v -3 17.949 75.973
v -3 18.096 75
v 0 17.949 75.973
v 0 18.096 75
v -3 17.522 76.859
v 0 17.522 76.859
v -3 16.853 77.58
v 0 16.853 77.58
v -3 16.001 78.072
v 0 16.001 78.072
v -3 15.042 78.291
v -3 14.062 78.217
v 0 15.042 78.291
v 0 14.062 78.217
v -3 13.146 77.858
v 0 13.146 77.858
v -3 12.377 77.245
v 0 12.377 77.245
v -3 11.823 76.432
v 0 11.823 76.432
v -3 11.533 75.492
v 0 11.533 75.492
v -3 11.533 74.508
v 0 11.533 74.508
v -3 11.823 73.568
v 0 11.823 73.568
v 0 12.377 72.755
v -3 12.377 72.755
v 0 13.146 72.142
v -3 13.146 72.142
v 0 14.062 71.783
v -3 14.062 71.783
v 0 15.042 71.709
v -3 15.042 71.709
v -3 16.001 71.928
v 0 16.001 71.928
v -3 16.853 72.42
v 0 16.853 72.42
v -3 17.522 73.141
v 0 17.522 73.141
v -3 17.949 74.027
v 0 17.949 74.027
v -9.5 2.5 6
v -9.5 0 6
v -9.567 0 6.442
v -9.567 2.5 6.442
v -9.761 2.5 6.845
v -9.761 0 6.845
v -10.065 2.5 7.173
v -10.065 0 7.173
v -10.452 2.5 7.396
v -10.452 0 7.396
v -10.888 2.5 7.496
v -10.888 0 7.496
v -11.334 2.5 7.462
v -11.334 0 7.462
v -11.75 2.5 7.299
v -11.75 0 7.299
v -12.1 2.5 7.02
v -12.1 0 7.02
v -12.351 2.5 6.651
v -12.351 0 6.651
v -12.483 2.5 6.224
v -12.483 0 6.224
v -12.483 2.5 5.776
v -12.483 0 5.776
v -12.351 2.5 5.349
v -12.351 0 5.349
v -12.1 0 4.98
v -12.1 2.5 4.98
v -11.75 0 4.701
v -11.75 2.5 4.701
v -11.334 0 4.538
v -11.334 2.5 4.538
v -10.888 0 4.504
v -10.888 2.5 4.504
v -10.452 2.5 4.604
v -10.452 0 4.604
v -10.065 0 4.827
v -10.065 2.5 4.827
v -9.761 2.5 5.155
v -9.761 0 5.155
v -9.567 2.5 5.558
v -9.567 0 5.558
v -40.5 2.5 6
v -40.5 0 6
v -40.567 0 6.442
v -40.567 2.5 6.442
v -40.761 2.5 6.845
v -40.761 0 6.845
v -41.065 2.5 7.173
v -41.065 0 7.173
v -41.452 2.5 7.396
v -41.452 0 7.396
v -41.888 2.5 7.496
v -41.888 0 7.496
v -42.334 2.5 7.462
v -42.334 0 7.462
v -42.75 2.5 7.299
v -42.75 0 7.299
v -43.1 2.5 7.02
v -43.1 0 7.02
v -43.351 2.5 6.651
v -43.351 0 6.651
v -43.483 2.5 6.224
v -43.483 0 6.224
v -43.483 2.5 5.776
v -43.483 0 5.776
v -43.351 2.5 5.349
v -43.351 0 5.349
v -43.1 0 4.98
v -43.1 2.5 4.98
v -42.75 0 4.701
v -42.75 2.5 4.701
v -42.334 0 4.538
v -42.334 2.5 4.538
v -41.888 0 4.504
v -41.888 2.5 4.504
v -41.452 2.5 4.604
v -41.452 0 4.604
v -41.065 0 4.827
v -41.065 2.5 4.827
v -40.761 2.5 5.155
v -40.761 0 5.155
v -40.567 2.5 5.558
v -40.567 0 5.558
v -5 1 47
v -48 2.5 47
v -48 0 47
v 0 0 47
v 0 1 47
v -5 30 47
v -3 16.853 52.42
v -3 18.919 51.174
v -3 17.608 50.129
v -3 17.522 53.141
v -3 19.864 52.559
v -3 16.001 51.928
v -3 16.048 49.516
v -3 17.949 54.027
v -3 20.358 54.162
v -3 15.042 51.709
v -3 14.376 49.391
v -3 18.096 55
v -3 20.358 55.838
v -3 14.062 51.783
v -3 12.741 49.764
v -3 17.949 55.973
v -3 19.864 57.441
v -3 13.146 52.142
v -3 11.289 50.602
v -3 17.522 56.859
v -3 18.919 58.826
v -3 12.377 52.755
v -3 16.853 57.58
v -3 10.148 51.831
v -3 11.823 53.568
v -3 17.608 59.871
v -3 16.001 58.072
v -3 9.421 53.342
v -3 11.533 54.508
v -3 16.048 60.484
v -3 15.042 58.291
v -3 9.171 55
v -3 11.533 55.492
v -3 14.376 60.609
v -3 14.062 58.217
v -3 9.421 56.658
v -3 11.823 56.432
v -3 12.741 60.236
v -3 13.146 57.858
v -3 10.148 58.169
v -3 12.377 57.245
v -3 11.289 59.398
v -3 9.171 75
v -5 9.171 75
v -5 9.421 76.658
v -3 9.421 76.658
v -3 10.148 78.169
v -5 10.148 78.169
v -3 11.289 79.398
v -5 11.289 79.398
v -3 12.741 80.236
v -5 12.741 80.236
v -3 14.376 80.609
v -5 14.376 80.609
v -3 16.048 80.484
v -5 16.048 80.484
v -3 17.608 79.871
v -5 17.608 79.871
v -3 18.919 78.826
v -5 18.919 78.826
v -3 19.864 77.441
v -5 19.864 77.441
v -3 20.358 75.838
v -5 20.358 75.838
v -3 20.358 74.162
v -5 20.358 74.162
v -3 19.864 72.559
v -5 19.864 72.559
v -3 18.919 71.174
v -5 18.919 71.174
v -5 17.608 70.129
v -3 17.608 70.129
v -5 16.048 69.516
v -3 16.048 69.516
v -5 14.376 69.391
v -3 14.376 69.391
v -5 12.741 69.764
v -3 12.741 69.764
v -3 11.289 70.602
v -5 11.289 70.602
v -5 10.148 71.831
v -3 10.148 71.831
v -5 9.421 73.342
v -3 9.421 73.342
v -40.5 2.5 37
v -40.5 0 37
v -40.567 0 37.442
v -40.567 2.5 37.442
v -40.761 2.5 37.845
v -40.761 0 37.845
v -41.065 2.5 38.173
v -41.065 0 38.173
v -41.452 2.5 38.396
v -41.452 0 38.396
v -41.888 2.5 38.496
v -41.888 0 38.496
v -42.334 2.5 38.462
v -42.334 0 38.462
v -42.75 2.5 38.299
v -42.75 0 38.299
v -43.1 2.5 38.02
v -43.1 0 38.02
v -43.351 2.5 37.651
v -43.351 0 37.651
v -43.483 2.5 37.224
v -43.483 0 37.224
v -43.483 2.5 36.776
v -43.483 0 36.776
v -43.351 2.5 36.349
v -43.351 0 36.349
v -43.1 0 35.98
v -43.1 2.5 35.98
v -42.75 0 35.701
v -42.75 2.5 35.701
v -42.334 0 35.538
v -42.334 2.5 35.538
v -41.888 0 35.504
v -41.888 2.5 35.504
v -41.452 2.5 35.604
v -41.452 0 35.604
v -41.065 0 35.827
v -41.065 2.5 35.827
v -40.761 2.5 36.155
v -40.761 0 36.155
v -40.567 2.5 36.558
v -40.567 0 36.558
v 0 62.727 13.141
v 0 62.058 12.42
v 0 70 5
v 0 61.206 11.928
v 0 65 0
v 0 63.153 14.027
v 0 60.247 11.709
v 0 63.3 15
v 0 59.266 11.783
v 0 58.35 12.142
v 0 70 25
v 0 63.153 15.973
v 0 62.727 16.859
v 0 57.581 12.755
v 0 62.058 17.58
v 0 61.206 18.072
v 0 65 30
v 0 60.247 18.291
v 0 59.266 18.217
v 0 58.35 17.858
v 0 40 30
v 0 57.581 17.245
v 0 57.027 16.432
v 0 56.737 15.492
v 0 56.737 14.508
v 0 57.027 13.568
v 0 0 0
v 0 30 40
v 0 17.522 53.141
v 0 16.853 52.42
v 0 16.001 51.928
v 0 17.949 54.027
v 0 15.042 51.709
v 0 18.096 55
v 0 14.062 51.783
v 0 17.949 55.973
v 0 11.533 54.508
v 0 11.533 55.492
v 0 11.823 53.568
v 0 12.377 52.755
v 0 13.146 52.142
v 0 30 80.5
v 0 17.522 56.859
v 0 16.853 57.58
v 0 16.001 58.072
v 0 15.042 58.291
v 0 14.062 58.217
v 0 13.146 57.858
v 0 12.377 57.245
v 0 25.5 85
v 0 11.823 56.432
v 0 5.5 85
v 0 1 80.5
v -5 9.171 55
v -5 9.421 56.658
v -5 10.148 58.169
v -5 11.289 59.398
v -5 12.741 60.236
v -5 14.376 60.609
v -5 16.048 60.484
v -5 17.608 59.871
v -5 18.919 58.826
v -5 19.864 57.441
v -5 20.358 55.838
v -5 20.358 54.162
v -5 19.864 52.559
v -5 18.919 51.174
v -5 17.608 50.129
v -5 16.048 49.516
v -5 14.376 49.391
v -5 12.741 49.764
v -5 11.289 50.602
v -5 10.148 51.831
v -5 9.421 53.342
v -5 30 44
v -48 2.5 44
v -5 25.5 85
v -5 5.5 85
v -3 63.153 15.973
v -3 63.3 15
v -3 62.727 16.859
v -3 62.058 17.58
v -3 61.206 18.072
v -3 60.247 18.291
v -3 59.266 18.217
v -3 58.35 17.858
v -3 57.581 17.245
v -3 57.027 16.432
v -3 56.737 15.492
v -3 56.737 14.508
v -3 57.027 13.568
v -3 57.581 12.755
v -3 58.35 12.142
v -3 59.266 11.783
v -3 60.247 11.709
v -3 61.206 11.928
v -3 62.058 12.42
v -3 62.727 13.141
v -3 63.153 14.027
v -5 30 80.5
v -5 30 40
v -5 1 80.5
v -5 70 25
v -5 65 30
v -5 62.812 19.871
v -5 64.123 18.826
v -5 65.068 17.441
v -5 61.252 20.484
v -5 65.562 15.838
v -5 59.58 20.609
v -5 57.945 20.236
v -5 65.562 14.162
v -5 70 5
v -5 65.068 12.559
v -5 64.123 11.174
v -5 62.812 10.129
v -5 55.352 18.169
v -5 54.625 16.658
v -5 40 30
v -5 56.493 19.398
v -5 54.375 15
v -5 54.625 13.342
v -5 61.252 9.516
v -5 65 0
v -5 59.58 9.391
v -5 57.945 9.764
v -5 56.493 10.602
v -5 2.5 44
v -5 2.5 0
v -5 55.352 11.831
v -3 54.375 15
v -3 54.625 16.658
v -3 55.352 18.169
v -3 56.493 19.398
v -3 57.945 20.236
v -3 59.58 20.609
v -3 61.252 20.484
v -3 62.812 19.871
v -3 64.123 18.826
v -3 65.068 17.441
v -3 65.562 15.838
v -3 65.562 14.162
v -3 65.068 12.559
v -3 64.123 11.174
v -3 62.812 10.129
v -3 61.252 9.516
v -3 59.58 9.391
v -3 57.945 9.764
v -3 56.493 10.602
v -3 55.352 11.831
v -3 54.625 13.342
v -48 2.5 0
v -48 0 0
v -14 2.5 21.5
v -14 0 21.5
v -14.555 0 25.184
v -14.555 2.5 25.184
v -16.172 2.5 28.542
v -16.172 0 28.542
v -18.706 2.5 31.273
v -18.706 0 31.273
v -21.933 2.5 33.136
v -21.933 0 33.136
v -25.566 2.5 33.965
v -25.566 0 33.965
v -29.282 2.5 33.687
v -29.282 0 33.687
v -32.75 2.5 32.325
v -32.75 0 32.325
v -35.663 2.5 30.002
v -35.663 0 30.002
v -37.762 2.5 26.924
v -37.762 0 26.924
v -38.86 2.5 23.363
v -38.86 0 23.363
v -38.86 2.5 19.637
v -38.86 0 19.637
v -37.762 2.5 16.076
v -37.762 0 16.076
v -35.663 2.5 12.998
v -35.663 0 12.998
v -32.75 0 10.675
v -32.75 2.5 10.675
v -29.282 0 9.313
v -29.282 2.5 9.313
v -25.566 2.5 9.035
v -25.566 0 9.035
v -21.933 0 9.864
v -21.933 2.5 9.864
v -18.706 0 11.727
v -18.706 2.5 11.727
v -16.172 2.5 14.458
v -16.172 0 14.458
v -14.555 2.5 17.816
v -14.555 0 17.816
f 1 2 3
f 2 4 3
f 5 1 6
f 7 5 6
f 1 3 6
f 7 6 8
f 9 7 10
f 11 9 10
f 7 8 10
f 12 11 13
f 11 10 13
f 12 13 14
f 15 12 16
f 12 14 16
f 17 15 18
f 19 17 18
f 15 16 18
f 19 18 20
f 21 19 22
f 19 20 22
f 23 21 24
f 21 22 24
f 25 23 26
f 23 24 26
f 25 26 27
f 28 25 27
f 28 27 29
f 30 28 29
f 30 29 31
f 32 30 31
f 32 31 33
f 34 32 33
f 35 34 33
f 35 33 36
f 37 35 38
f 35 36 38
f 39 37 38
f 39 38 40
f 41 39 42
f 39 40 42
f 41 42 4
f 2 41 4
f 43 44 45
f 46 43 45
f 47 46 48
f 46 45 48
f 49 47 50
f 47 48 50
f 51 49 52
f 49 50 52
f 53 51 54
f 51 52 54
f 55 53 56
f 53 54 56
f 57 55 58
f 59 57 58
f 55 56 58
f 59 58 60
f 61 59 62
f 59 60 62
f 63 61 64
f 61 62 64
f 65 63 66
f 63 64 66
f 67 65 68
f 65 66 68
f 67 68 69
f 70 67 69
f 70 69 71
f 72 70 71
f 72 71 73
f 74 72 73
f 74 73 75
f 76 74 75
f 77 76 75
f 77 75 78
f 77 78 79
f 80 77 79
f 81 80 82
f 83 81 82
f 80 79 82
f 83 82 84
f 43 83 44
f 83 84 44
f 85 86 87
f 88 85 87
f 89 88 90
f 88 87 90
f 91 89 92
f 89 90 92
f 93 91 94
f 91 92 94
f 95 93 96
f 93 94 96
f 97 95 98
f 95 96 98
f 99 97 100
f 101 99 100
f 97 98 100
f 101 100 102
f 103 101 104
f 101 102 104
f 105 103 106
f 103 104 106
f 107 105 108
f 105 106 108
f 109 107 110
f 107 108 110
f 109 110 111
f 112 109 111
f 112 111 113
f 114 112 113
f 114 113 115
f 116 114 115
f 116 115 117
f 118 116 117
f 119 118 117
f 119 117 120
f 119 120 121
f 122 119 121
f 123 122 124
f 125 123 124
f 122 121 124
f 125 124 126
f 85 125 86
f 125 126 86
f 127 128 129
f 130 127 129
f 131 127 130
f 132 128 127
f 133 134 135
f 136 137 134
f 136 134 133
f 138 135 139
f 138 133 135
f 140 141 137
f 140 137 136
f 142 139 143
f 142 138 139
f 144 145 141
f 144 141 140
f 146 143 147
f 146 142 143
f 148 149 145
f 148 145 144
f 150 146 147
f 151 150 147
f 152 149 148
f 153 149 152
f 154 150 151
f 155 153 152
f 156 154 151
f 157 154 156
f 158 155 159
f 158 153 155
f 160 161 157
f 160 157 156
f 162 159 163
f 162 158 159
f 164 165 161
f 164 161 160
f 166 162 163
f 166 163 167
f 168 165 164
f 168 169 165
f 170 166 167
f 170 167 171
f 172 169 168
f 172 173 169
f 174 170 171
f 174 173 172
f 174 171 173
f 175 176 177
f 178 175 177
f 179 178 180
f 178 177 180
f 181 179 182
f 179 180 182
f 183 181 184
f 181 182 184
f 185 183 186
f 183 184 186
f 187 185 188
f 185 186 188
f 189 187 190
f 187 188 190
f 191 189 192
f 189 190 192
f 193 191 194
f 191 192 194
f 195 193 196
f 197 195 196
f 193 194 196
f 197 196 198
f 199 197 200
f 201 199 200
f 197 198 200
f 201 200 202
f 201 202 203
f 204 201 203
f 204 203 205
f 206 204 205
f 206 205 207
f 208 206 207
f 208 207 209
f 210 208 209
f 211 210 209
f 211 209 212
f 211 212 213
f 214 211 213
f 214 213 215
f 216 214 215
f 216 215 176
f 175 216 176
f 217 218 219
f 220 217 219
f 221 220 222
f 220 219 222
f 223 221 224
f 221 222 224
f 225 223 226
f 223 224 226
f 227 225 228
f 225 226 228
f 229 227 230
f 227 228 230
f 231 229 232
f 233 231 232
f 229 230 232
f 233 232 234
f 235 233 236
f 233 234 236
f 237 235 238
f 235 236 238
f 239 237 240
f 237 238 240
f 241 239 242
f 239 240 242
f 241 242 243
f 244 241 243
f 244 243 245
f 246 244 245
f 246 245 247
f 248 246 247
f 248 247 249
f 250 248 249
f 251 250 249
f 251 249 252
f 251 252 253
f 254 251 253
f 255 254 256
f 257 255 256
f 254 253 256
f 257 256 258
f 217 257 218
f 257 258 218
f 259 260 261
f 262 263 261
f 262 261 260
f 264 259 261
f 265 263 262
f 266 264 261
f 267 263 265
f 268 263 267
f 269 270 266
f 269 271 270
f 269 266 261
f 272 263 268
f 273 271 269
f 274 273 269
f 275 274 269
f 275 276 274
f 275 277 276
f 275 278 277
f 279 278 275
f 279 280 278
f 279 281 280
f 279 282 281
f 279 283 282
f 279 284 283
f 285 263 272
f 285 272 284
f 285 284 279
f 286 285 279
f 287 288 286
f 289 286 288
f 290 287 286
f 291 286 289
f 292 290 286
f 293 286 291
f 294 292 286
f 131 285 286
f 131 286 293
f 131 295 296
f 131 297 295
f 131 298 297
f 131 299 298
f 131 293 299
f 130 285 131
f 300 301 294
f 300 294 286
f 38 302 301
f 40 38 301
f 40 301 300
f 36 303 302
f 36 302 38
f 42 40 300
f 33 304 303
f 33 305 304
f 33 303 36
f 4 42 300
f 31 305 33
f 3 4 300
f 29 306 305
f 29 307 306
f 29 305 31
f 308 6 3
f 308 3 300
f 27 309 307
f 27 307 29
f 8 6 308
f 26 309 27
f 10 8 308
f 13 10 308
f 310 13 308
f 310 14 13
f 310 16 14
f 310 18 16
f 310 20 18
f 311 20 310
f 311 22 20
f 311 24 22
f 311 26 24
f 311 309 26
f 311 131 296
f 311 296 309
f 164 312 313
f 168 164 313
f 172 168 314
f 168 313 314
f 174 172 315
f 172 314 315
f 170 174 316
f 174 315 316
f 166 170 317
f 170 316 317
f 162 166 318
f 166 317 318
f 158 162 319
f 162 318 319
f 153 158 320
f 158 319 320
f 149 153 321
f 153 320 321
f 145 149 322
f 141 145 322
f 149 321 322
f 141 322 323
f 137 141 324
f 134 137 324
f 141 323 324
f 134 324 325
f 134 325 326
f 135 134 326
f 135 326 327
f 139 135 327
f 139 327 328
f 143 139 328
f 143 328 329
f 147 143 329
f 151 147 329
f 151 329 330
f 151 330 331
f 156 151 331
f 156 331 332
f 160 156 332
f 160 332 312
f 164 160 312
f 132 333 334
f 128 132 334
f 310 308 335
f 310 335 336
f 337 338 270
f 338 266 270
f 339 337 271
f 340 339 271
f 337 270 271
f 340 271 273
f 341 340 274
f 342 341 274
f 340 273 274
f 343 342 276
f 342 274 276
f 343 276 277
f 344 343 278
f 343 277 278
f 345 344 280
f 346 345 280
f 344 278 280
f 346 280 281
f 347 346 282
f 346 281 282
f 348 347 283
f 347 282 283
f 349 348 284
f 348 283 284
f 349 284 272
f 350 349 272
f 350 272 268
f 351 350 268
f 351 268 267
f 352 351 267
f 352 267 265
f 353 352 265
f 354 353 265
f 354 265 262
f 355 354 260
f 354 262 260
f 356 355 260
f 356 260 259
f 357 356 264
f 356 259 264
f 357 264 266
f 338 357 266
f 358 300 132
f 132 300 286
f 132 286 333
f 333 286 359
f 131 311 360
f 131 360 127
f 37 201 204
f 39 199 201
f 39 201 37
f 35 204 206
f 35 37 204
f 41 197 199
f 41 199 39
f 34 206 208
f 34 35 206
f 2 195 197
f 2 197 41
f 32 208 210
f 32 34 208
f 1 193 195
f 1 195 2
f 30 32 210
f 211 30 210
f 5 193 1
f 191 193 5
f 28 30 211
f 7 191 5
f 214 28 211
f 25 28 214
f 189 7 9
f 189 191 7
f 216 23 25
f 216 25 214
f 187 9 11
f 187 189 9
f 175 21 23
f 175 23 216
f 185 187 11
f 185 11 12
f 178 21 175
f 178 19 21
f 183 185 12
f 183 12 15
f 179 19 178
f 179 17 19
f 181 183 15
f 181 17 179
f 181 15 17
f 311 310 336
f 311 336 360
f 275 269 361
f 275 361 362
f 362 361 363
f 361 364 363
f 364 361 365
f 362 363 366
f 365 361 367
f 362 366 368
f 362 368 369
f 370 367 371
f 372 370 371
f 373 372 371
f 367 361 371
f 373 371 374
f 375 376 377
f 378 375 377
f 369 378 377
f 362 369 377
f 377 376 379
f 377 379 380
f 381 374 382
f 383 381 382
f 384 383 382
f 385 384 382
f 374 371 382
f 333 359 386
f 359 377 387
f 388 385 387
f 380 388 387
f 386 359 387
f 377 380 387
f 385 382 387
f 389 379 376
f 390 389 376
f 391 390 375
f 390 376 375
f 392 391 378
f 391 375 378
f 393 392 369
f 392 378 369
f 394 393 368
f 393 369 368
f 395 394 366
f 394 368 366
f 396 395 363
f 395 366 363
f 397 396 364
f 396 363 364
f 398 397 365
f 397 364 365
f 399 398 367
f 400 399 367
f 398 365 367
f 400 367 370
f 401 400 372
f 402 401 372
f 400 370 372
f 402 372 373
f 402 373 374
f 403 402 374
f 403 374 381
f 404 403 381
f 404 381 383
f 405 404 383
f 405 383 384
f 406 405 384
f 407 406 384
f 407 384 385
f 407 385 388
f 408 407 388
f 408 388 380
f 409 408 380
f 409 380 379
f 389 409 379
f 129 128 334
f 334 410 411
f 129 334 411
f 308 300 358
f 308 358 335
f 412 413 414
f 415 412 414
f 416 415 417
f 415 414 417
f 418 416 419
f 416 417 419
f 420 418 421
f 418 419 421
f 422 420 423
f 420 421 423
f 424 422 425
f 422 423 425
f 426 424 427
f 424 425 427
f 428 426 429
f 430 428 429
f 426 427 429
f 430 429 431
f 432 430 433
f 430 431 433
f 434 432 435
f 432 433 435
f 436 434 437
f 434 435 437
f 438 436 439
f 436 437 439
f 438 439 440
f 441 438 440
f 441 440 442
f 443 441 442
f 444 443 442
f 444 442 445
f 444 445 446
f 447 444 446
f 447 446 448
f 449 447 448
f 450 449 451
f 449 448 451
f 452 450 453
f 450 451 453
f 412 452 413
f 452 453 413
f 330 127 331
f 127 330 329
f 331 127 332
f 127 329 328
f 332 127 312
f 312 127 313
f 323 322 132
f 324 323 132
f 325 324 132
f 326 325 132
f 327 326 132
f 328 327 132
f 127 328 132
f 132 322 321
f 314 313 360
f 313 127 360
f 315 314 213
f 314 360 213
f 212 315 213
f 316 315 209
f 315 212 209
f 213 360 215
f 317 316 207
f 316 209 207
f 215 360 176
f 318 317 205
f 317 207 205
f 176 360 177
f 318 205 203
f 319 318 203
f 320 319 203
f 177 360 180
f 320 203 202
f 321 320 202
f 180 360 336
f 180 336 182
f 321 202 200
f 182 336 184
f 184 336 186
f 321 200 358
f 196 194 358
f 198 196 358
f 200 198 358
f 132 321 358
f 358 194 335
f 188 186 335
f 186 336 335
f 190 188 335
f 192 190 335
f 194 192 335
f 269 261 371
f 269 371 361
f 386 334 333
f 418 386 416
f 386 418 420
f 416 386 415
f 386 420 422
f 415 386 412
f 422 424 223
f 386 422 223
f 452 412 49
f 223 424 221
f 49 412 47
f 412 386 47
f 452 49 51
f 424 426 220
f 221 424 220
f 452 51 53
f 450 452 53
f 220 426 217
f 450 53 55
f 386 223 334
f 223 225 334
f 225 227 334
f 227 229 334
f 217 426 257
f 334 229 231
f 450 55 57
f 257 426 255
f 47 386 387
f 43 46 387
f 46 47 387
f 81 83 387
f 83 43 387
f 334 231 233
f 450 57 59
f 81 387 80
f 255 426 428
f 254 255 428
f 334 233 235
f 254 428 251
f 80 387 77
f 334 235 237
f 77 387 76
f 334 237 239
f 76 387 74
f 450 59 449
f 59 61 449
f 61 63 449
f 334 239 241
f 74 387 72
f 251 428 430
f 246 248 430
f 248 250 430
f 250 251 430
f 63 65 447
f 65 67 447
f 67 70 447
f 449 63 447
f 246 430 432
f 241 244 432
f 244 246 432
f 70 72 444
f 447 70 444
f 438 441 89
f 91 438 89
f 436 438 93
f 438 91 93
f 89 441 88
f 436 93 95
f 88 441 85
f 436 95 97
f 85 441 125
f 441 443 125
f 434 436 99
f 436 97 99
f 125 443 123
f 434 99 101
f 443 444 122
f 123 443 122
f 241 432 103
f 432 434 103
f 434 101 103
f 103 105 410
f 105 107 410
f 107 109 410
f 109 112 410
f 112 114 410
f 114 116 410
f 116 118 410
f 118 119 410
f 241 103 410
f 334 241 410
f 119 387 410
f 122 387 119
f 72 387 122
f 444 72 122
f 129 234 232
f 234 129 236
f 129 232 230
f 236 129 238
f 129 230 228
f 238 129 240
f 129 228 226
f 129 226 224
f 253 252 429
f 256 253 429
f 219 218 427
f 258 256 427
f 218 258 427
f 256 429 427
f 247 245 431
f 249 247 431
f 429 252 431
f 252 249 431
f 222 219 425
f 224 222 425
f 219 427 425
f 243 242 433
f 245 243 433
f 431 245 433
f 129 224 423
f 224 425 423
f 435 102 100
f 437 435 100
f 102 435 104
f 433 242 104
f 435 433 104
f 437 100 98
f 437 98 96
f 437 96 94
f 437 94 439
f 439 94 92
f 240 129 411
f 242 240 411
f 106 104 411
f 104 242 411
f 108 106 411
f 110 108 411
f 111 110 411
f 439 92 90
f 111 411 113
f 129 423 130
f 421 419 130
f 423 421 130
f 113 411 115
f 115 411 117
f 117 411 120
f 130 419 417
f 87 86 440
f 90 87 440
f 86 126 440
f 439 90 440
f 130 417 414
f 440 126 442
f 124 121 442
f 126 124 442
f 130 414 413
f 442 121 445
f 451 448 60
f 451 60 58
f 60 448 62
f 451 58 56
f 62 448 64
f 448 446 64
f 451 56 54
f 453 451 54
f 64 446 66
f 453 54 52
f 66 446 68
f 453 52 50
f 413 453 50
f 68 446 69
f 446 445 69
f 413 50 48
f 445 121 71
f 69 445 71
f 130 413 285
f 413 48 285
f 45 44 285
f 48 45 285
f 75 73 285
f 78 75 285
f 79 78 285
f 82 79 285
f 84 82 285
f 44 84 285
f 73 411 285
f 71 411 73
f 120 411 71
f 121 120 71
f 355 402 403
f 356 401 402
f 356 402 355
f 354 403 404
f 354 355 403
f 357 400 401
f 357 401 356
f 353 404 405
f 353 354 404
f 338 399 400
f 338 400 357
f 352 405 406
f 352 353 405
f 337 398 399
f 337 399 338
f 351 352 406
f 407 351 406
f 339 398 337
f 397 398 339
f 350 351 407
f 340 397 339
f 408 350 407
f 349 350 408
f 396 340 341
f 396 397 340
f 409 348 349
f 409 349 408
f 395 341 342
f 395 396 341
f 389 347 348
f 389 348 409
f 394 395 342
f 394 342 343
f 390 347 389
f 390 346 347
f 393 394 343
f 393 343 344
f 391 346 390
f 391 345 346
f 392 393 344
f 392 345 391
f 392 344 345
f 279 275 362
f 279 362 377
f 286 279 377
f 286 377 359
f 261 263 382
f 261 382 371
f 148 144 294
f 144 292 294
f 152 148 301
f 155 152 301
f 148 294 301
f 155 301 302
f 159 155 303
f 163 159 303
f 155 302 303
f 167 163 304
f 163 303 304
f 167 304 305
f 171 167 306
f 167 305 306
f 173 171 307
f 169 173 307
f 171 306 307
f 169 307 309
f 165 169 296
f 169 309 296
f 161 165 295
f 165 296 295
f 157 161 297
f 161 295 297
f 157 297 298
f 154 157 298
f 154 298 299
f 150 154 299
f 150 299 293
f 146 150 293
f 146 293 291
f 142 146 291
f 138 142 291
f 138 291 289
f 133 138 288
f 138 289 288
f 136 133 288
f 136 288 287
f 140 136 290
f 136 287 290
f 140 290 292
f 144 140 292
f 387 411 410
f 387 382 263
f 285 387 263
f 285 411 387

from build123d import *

# Parameters (mm, degrees)
F0_W           = 48
F0_H           = 43
F0_R           = 1.5
F0_R_2         = 12.5
F1_DEPTH       = 2.5
F3_DEPTH       = 5
F5_D           = 6.6
F5_DEPTH       = 20
F5_CBORE_D     = 11.25
F5_CBORE_DEPTH = 2
F7_DEPTH       = 4
F8_DEPTH       = 1


with BuildPart() as f1:
    # F0 (on Front) → F1 (new body)
    with BuildSketch(Plane.XZ):
        with Locations((-24, 21.5)):
            Rectangle(F0_W, F0_H)
        with Locations((-42, 6)):
            Circle(F0_R, mode=Mode.SUBTRACT)
        with Locations((-11, 6)):
            Circle(F0_R, mode=Mode.SUBTRACT)
        with Locations((-26.5, 21.5)):
            Circle(F0_R_2, mode=Mode.SUBTRACT)
        with Locations((-42, 37)):
            Circle(F0_R, mode=Mode.SUBTRACT)
    extrude(amount=-F1_DEPTH)

    # F2 (on Right) → F3 (join)
    with BuildSketch(Plane.YZ):
        Polygon((1, 43), (0, 43), (0, 0), (65, 0), (70, 5), (70, 25), (65, 30), (40, 30), (30, 40), (30, 80.5), (25.5, 85), (5.5, 85), (1, 80.5), align=None)
    extrude(amount=-F3_DEPTH)

    # F5
    with Locations(Plane(origin=(-5, 0, 0), x_dir=(0, -1, 0), z_dir=(-1, 0, 0))):
        with Locations((-14.795874, 75), (-14.795874, 55), (-60, 15)):
            CounterBoreHole(F5_D / 2, F5_CBORE_D / 2, F5_CBORE_DEPTH, depth=F5_DEPTH)

    # F6 (on face) → F7 (join)
    with BuildSketch(Plane.XY.offset(43)):
        Polygon((-5, 30), (-48, 2.5), (-5, 2.5), (-5, 1), (0, 1), (0, 30), align=None)
        Polygon((-48, 2.5), (-48, 0), (0, 0), (0, 1), (-5, 1), (-5, 2.5), align=None)
    extrude(amount=F7_DEPTH)

    # F7_face (on face) → F8 (cut)
    with BuildSketch(Plane(origin=(-19.333333, 11.666667, 43), x_dir=(1, 0, 0), z_dir=(0, 0, -1))):
        Polygon((14.333333, -18.333333), (14.333333, 9.166667), (-28.666667, 9.166667), align=None)
    extrude(amount=-F8_DEPTH, mode=Mode.SUBTRACT)


solid = f1.part
